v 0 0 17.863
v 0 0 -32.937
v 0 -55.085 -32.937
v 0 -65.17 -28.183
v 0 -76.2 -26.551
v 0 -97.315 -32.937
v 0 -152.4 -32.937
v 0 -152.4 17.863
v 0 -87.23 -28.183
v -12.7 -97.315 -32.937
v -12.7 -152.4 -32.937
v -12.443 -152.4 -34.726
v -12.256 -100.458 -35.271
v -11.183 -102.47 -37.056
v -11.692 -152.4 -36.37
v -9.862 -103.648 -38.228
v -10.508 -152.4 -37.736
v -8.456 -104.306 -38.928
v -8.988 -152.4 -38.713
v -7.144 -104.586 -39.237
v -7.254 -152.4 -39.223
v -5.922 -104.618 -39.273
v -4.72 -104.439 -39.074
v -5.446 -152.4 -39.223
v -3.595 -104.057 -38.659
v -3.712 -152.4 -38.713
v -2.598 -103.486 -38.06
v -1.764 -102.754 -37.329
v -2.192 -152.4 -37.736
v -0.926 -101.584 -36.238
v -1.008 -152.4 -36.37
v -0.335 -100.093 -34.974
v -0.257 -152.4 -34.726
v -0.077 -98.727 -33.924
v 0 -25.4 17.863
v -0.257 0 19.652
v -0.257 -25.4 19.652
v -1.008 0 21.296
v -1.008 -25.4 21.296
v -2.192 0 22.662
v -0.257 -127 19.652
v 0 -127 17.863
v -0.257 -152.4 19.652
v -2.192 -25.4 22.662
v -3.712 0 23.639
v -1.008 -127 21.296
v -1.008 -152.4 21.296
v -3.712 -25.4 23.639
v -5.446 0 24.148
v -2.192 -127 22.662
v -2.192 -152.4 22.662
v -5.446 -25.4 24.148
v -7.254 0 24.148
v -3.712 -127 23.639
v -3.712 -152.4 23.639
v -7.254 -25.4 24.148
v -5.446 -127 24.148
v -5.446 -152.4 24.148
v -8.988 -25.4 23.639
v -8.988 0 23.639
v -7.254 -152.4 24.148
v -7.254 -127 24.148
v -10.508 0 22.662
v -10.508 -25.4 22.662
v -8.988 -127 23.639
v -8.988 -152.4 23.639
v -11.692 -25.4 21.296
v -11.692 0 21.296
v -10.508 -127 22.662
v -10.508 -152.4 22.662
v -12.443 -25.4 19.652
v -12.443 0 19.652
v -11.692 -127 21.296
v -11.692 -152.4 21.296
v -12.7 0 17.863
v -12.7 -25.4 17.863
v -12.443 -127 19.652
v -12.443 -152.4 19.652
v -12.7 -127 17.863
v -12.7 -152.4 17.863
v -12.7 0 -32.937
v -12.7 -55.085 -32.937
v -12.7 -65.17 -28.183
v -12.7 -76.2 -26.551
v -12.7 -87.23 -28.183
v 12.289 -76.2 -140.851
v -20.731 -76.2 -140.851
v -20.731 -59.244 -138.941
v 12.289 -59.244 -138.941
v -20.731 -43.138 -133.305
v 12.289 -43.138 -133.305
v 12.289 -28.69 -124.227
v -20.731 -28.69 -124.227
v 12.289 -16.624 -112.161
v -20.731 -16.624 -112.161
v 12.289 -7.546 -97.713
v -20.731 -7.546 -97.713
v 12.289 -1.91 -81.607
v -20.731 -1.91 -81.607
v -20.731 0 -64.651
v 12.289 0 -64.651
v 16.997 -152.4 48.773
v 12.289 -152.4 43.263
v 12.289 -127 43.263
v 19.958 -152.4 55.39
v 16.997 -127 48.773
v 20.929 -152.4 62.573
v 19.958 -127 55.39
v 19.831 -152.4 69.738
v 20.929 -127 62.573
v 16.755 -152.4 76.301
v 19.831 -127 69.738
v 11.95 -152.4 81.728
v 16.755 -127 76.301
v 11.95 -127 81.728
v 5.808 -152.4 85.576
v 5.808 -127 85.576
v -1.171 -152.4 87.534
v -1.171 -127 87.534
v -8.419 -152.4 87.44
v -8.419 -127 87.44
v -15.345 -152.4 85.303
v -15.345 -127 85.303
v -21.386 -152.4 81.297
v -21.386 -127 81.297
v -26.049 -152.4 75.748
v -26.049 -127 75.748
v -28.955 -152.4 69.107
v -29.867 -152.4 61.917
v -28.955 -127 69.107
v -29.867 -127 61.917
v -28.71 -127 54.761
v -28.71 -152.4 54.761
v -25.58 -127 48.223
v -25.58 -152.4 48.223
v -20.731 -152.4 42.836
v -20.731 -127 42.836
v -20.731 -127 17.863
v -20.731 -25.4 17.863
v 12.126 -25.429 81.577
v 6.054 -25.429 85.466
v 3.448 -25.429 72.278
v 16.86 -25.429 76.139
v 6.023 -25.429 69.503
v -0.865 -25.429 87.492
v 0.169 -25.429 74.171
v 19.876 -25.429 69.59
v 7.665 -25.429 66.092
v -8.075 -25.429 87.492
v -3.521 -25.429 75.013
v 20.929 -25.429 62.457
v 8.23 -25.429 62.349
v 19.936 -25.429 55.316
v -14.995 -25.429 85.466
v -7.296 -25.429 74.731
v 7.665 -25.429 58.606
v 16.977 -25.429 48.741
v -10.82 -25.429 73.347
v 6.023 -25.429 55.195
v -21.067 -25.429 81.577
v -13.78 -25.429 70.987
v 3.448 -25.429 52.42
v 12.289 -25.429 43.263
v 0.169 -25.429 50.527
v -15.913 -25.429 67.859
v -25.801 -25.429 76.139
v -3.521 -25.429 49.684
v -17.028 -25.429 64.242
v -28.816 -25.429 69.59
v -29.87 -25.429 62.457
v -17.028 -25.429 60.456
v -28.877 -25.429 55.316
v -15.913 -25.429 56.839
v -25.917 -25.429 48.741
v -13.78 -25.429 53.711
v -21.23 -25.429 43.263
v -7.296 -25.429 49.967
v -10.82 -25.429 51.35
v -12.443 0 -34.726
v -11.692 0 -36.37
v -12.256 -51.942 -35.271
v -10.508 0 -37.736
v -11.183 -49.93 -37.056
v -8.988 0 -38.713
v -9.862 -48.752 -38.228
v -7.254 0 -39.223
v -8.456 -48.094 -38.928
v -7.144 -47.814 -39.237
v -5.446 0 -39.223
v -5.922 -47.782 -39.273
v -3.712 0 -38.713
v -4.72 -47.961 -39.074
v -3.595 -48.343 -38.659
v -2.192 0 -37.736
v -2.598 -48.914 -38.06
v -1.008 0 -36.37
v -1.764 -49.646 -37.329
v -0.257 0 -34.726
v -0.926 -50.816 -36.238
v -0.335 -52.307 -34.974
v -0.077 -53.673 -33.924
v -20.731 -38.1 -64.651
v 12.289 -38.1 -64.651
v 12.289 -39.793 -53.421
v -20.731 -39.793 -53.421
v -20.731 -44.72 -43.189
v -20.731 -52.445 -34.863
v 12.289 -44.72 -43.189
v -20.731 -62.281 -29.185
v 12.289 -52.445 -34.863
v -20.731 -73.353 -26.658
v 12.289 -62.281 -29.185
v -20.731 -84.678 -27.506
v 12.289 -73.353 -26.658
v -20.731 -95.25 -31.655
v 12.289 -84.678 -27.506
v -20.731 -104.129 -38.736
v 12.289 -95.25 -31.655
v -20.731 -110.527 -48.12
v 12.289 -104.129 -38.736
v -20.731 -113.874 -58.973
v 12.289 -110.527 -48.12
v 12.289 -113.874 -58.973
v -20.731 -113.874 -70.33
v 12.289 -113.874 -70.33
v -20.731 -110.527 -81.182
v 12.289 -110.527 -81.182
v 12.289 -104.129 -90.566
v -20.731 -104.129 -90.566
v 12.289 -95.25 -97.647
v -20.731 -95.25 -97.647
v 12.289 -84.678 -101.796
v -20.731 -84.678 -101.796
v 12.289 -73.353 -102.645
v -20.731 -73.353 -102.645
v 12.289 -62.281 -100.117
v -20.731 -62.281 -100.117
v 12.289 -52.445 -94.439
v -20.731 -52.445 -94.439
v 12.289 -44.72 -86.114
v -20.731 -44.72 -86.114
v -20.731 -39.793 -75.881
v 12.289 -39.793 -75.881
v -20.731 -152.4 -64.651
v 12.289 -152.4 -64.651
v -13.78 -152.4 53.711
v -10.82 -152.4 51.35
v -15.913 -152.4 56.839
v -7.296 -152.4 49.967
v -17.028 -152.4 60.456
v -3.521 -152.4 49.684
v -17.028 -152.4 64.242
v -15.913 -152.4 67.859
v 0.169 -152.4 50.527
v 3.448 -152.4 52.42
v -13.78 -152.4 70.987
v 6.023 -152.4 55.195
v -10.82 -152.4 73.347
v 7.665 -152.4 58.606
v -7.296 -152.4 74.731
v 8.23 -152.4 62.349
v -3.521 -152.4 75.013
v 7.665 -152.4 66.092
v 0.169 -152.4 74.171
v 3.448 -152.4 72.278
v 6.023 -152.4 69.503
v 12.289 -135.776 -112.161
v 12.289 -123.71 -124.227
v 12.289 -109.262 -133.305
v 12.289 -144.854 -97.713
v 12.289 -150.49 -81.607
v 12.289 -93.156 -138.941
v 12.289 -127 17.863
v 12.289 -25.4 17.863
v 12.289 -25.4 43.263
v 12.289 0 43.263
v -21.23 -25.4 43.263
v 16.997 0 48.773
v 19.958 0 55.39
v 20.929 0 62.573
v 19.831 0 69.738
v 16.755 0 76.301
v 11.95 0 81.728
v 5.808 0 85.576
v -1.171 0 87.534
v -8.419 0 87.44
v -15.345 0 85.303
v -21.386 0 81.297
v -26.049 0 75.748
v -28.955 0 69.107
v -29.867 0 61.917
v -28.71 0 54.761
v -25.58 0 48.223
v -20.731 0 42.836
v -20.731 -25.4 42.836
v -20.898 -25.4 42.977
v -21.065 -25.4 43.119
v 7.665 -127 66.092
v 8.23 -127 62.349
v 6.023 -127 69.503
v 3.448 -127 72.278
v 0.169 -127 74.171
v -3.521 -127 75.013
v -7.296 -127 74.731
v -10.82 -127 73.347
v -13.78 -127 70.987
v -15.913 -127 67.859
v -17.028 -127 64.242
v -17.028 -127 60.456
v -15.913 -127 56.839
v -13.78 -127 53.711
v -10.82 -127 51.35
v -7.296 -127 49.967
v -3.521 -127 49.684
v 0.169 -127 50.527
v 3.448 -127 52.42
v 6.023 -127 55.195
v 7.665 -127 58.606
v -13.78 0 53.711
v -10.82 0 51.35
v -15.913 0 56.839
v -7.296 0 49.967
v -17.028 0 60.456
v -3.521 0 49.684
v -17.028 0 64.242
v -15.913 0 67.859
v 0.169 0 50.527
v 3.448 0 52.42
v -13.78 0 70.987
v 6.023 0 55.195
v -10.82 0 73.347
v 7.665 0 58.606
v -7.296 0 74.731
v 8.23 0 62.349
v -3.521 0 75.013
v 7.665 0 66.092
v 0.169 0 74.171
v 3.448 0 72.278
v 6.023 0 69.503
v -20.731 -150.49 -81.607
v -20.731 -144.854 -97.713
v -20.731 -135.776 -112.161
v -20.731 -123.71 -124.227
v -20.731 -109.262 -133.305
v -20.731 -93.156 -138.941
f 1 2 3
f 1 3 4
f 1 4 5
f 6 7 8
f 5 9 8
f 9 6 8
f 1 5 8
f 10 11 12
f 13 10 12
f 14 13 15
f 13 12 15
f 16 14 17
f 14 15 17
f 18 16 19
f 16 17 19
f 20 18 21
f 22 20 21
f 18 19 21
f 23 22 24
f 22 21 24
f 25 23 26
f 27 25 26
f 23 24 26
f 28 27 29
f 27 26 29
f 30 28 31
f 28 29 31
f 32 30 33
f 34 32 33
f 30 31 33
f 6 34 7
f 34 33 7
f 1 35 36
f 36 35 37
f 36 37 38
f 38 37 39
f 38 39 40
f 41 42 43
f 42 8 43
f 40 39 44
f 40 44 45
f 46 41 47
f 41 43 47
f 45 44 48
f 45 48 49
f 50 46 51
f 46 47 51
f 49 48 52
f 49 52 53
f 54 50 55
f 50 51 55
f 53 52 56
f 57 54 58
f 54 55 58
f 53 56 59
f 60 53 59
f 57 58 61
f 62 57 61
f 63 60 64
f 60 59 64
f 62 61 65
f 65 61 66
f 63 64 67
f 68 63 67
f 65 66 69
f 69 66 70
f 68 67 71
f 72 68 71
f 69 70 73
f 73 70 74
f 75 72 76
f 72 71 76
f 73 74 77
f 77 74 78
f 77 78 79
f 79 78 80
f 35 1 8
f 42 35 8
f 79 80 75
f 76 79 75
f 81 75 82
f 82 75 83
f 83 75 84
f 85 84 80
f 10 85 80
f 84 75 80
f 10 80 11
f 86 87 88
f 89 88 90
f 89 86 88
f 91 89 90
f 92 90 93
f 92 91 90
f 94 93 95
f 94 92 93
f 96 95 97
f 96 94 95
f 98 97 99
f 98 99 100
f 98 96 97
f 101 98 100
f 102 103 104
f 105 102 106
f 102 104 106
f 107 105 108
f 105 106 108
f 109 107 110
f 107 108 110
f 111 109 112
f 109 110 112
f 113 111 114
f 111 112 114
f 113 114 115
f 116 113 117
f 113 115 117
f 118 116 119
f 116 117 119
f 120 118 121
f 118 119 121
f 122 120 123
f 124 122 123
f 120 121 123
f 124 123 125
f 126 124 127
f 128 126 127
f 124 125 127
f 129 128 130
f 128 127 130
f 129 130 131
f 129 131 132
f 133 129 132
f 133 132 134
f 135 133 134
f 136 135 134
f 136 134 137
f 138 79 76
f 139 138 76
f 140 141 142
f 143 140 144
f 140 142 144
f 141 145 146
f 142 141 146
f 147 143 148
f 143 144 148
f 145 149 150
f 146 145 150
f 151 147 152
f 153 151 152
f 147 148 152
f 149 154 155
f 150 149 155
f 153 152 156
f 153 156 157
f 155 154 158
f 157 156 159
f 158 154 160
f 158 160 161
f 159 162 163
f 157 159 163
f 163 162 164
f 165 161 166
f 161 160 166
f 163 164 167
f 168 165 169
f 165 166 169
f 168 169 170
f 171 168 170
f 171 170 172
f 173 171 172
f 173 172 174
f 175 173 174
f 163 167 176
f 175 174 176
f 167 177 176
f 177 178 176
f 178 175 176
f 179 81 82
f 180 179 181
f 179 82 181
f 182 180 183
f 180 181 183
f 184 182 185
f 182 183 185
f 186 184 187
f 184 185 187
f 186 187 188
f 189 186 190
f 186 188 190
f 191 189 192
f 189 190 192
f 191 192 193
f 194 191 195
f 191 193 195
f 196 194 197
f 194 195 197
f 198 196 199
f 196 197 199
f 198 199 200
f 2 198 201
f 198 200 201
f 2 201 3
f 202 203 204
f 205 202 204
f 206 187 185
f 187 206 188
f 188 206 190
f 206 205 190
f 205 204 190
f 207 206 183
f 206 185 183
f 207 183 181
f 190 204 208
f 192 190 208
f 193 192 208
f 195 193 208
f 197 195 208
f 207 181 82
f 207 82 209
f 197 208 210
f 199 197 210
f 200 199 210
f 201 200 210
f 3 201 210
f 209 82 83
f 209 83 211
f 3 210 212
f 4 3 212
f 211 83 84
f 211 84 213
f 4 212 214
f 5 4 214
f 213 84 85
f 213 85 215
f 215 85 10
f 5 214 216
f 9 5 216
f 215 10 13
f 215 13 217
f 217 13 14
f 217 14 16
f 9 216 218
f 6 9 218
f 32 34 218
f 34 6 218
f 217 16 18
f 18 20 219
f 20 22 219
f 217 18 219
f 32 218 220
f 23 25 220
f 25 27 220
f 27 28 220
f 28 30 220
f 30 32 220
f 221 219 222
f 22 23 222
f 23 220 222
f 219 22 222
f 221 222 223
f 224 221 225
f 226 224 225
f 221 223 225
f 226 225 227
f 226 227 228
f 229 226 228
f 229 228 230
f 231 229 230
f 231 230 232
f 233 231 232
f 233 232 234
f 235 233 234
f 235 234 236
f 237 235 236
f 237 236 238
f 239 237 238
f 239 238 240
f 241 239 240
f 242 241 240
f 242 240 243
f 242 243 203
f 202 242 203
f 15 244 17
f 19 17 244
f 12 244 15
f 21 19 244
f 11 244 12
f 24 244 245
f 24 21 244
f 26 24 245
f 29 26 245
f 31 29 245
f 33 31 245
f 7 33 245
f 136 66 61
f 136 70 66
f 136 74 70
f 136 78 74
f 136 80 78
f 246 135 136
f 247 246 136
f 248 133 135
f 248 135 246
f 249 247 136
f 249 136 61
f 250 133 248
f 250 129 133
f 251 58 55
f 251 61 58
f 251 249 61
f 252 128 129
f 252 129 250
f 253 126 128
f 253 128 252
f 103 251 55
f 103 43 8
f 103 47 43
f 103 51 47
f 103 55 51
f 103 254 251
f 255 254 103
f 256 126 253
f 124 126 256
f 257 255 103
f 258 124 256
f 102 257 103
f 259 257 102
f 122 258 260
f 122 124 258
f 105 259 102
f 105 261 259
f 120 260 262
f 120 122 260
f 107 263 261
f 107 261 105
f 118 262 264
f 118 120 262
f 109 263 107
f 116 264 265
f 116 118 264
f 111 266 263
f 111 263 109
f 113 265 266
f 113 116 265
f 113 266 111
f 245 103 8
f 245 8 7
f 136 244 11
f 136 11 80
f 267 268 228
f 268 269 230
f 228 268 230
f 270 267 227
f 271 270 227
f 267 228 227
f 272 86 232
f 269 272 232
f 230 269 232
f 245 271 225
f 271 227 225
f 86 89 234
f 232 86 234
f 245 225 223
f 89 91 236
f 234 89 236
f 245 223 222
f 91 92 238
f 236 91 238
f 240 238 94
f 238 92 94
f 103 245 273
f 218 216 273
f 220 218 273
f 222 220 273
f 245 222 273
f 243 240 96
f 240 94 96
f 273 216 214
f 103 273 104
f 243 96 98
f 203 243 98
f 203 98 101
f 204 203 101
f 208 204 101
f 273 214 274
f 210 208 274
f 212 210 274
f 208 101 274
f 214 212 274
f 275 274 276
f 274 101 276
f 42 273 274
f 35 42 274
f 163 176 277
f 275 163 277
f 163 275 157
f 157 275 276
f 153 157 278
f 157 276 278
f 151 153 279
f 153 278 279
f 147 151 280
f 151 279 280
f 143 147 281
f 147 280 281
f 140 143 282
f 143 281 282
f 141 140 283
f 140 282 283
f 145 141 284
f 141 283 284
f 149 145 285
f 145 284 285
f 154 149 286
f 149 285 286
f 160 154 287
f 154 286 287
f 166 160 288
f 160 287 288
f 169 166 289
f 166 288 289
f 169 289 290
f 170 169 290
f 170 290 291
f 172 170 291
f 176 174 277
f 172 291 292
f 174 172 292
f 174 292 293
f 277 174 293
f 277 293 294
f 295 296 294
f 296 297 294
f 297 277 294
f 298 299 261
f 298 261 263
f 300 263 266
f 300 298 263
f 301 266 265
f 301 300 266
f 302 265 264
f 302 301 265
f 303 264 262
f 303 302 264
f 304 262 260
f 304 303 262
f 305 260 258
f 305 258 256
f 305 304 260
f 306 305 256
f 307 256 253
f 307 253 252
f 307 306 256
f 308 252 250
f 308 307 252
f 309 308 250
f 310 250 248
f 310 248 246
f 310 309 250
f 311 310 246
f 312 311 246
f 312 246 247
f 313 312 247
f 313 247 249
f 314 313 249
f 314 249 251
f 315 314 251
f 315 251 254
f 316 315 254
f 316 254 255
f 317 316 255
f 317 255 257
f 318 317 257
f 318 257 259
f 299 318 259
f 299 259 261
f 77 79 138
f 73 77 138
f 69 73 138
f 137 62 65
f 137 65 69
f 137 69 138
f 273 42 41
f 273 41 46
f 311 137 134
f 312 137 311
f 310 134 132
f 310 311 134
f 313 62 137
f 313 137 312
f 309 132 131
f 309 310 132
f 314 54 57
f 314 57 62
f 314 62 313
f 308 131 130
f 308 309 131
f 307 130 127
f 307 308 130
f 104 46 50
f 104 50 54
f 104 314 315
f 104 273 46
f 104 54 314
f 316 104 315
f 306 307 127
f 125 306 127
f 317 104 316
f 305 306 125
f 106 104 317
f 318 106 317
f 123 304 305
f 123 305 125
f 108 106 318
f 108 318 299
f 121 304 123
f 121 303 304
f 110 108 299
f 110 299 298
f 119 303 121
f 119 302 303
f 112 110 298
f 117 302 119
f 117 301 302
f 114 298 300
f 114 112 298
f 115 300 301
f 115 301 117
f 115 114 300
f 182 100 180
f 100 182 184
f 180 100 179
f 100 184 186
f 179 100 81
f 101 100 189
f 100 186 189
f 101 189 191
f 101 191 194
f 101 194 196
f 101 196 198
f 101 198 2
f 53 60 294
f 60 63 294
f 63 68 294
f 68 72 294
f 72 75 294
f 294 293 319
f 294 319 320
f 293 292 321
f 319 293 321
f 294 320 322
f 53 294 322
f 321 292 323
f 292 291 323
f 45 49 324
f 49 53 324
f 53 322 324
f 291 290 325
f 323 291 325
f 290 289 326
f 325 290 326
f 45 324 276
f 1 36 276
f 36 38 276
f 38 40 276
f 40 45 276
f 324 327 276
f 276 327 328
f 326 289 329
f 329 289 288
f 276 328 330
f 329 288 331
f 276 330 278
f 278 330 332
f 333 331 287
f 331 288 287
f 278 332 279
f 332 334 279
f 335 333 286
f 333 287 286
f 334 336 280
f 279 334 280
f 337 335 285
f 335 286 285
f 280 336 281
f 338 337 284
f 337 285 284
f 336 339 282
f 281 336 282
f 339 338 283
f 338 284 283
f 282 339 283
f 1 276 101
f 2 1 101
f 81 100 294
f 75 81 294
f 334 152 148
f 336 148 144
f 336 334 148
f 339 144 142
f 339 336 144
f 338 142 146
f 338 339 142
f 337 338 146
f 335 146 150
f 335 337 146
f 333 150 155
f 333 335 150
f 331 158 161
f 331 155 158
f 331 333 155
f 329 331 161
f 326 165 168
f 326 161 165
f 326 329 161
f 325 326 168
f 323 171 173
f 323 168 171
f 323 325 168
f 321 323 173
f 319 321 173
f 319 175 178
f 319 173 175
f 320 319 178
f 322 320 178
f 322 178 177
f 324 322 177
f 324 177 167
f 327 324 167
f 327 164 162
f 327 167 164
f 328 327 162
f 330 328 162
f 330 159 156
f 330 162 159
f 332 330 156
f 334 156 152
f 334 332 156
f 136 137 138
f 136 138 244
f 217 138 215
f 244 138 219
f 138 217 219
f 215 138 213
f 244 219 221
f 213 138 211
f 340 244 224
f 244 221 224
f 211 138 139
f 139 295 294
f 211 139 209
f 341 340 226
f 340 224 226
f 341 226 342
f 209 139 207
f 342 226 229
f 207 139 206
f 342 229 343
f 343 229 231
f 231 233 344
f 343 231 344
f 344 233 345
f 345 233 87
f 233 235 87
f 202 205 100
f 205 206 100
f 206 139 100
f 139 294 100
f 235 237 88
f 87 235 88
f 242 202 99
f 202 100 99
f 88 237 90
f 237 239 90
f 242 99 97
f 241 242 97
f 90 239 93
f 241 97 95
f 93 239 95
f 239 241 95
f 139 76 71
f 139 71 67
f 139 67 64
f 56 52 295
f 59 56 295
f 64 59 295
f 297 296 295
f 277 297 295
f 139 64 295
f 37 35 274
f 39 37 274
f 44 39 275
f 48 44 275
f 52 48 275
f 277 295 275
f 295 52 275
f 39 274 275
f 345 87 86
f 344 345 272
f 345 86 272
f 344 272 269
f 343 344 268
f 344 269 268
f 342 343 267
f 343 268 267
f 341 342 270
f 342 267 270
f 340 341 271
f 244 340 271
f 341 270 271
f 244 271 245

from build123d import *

# Parameters (mm, degrees)
F0_R     = 12.7
F1_DEPTH = 152.4
F2_R     = 76.19999
F3_R     = 38.1
F4_DEPTH = 42.1602994648
F3_W     = 101.6
F3_H     = 25.4
F5_DEPTH = 42.1602994648
F7_DEPTH = 45.29165
F9_DEPTH = 152.401


# Not quite as in the source:
# - a fillet or chamfer is up to 0.001 mm smaller than in the source, because OpenCascade refuses the exact size


with BuildPart() as f1:
    # F0 (on Front) → F1 (new body)
    with BuildSketch(Plane.XZ):
        with BuildLine():
            ThreePointArc((12.2889600906, 43.2626888076), (-4.7984134102, 87.7468446554), (-20.7310399094, 42.83615698))
            Line((-20.7310399094, 42.83615698), (-20.7310399094, -140.8510365048))
            Line((-20.7310399094, -140.8510365048), (12.2889600906, -140.8510365048))
            Line((12.2889600906, -140.8510365048), (12.2889600906, 43.2626888076))
        make_face()
        with Locations((-4.4703393742, 62.3489634952)):
            Circle(F0_R, mode=Mode.SUBTRACT)
    extrude(amount=F1_DEPTH)

    # F2 (radius 76.2 in the source; OpenCascade refuses exactly that, so slightly less here)
    f2_edges = [f1.edges().sort_by_distance(p)[0] for p in [
        (-4.22104, -152.4, -140.851037),
        (-4.22104, 0, -140.851037),
    ]]
    fillet(f2_edges, radius=F2_R)

    # F3 (on face) → F4 (cut, through all)
    with BuildSketch(Plane.YZ.offset(12.2889600906)):
        with Locations((-76.2, -64.6510365048)):
            Circle(F3_R)
    extrude(amount=-F4_DEPTH, mode=Mode.SUBTRACT)

    # F3 (on face) → F5 (cut, through all)
    with BuildSketch(Plane.YZ.offset(12.2889600906)):
        with Locations((-76.2, 30.5626888076)):
            Rectangle(F3_W, F3_H)
    extrude(amount=-F5_DEPTH, mode=Mode.SUBTRACT)

    # F6 (on face) → F7 (cut, symmetric)
    with BuildSketch(Plane(origin=(-20.7310399094, 0, 0), x_dir=(0, -1, 0), z_dir=(-1, 0, 0))):
        Polygon((25.4293922335, 17.8626888076), (127, 17.8626888076), (127, 42.83615698), (127, 109.7837612033), (25.4293922335, 109.7837612033), align=None)
    extrude(amount=F7_DEPTH, both=True, mode=Mode.SUBTRACT)

    # F8 (on face) → F9 (cut, through all)
    with BuildSketch(Plane.XZ.offset(152.4)):
        with BuildLine():
            Line((0, -32.9373111924), (0, 17.8626878918))
            ThreePointArc((0, 17.8626878918), (-6.35, 24.2126888076), (-12.7, 17.8626878918))
            Line((-12.7, 17.8626878918), (-12.7, -32.9373111924))
            ThreePointArc((-12.7, -32.9373111924), (-6.35, -39.2873111924), (0, -32.9373111924))
        make_face()
    extrude(amount=-F9_DEPTH, mode=Mode.SUBTRACT)


solid = f1.part
